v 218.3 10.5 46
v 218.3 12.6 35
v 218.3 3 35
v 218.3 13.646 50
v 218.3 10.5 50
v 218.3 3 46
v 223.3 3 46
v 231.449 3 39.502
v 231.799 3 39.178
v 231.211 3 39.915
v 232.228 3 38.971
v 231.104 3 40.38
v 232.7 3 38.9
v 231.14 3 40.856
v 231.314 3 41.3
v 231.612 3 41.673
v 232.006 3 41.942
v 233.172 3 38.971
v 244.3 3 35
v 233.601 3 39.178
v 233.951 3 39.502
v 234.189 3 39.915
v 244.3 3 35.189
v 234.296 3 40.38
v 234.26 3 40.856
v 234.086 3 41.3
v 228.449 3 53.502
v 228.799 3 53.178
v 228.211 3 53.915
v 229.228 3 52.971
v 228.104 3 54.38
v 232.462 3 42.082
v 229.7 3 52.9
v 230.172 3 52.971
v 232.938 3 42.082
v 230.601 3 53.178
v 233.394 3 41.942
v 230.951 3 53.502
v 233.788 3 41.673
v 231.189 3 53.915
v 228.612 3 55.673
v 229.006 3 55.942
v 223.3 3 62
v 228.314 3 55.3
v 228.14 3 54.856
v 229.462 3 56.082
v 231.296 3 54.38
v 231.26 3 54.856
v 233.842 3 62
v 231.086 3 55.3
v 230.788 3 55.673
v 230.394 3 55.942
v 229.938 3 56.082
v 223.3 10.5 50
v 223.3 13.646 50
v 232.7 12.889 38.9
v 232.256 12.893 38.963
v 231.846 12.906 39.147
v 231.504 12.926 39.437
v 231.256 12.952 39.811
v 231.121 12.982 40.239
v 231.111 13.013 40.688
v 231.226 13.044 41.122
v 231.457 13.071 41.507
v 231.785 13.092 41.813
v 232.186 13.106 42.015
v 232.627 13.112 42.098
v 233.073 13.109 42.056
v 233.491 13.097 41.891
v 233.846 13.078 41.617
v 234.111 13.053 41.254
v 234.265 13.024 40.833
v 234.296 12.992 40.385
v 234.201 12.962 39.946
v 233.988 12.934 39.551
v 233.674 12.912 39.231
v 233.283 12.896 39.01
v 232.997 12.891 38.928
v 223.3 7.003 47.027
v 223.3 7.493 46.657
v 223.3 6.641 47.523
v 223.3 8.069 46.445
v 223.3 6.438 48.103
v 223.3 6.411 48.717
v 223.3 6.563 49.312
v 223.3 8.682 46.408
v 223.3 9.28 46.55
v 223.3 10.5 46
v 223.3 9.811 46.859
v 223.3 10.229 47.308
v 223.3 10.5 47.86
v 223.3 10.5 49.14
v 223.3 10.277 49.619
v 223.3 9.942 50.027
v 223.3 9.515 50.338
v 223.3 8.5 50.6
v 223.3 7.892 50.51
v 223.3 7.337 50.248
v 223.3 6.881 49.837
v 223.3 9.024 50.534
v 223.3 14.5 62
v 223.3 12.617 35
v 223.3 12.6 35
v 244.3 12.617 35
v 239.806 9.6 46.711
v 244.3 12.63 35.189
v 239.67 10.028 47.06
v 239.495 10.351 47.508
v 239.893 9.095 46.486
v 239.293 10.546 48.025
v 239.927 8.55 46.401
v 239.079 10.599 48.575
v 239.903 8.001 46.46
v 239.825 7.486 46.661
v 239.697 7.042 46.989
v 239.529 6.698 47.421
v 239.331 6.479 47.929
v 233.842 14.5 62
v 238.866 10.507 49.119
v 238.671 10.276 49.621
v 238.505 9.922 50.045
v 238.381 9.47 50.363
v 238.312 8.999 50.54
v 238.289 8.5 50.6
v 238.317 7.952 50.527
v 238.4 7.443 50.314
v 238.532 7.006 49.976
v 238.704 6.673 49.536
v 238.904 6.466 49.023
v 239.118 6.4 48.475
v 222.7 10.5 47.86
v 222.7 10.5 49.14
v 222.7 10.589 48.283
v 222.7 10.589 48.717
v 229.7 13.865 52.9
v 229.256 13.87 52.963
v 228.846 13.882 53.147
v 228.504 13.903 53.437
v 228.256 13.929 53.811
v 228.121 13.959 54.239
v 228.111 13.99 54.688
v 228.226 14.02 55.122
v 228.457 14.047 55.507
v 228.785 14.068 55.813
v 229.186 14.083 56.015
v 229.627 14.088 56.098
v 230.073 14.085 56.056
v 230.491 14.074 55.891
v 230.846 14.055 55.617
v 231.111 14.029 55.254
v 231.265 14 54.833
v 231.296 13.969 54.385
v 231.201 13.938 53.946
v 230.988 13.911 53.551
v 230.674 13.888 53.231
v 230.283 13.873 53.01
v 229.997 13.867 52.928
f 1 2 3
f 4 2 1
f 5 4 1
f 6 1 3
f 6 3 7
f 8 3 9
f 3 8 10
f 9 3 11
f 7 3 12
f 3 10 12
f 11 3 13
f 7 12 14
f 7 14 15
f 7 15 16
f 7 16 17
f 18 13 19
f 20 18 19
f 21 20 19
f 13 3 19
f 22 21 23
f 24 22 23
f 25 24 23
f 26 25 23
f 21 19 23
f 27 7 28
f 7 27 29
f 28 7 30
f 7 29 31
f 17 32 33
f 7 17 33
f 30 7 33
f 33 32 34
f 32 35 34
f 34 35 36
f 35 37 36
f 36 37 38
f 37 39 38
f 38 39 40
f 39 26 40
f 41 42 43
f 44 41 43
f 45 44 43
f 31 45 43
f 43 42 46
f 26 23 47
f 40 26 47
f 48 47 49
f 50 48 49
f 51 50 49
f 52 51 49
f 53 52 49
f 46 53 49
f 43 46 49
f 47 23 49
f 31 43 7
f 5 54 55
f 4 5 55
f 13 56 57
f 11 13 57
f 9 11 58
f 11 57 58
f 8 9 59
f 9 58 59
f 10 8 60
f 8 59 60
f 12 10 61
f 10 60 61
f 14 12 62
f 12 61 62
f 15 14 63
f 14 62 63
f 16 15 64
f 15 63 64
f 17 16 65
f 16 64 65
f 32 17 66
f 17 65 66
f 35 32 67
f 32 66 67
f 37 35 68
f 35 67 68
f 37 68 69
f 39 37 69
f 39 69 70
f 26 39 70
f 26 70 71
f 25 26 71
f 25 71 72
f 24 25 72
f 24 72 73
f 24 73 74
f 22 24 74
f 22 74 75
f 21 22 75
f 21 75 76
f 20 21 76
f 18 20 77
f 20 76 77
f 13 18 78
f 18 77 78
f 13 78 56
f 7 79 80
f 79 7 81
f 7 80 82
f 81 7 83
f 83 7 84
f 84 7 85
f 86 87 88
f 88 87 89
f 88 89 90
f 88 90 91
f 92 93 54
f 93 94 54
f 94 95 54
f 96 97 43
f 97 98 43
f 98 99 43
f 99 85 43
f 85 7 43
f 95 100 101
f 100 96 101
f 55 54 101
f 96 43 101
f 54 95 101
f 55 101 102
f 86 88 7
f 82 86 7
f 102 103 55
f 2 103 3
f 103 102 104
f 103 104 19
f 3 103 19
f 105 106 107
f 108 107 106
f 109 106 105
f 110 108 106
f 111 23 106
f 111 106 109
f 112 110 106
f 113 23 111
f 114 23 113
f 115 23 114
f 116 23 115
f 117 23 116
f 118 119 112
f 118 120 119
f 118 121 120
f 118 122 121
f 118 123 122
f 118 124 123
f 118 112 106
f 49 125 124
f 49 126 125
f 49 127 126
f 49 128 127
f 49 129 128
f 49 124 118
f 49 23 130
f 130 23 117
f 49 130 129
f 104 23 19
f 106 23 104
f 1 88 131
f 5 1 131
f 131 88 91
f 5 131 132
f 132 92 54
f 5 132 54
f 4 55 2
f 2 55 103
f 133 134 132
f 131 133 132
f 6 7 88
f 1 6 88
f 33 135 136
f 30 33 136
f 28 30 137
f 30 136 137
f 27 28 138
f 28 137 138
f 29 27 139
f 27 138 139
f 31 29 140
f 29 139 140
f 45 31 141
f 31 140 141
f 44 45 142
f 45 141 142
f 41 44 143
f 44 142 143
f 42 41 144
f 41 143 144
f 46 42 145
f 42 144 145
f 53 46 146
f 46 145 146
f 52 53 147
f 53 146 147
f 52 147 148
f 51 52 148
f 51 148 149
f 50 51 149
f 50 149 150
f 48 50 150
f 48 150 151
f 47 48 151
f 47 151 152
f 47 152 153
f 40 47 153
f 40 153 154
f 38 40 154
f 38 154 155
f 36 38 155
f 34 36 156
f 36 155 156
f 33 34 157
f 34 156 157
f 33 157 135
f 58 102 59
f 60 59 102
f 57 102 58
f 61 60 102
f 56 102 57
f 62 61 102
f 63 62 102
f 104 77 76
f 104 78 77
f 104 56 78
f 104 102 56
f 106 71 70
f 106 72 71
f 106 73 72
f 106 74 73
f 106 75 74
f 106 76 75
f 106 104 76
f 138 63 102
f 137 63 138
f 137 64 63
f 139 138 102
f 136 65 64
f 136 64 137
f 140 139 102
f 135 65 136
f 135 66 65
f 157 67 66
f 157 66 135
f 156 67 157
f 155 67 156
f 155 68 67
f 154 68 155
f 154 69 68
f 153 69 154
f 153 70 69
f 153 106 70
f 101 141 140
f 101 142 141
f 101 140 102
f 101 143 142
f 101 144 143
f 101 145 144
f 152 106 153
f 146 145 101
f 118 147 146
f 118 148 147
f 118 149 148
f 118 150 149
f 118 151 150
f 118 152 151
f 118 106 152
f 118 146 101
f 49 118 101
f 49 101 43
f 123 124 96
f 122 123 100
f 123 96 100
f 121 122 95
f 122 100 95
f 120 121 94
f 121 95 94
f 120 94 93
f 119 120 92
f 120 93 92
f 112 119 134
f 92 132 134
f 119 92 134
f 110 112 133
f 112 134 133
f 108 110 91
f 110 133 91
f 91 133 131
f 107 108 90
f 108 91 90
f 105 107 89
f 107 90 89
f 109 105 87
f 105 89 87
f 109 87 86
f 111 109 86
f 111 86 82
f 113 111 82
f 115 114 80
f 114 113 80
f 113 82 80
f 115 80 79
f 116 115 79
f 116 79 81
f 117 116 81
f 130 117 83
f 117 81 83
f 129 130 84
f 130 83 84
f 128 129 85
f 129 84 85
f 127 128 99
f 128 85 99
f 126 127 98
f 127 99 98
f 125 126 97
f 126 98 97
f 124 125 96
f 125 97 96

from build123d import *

# Parameters (mm, degrees)
CYLINDER181_R     = 2.1
CYLINDER181_DEPTH = 19
CYLINDER127_R     = 1.6
CYLINDER127_DEPTH = 40
CYLINDER124_R     = 1.6
CYLINDER124_DEPTH = 40
EXTRUDE067_DEPTH  = 5
EXTRUDE050_DEPTH  = 15
EXTRUDE049_DEPTH  = 21


with BuildPart() as cylinder181:
    # Cylinder181 → Cylinder181 (new body)
    with BuildSketch(Plane(origin=(15.3, 8.5, 48.5), x_dir=(0, 0, 1), z_dir=(-1, 0, 0))):
        Circle(CYLINDER181_R)
    extrude(amount=CYLINDER181_DEPTH)


with BuildPart() as cylinder127:
    # Cylinder127 → Cylinder127 (new body)
    with BuildSketch(Plane(origin=(5.3, 42, 40.5), x_dir=(0, 0, -1), z_dir=(0, -1, 0))):
        Circle(CYLINDER127_R)
    extrude(amount=CYLINDER127_DEPTH)


with BuildPart() as cylinder124:
    # Cylinder124 → Cylinder124 (new body)
    with BuildSketch(Plane(origin=(8.3, 42, 54.5), x_dir=(0, 0, -1), z_dir=(0, -1, 0))):
        Circle(CYLINDER124_R)
    extrude(amount=CYLINDER124_DEPTH)


with BuildPart() as extrude067:
    # Sketch055 → Extrude067 (new body)
    with BuildSketch(Plane.YZ):
        Polygon((3, 46), (10.5, 46), (10.5, 50), (13.646271, 50), (12.6, 35), (3, 35), align=None)
    extrude(amount=EXTRUDE067_DEPTH)


with BuildPart() as extrude067_1:
    # Extrude067 placement: moved
    add(extrude067.part.moved(Location((14.7, 0, 0))))


with BuildPart() as extrude050:
    # Sketch040 → Extrude050 (new body)
    with BuildSketch(Plane.XZ):
        Polygon((-8.16038, 62.64716), (-8.16038, 30.419451), (4.410427, 62.64716), align=None)
    extrude(amount=-EXTRUDE050_DEPTH)


with BuildPart() as extrude050_1:
    # Extrude050 placement: moved
    add(extrude050.part.moved(Location((0, 1.5, 0))))


with BuildPart() as cut276:
    # Sketch039 → Extrude049 (new body)
    with BuildSketch(Plane.YZ):
        Polygon((3, 62), (3, 35), (12.616711, 35), (14.5, 62), align=None)
    extrude(amount=EXTRUDE049_DEPTH)


with BuildPart() as cut276_1:
    # Extrude049 placement: moved
    add(cut276.part.moved(Location((-6.3, 0, 0))))

    # Cut273: cut Extrude050
    add(extrude050_1.part, mode=Mode.SUBTRACT)

    # Fusion115: union Extrude067
    add(extrude067_1.part)

    # Cut274: cut Cylinder124
    add(cylinder124.part, mode=Mode.SUBTRACT)

    # Cut275: cut Cylinder127
    add(cylinder127.part, mode=Mode.SUBTRACT)

    # Cut276: cut Cylinder181
    add(cylinder181.part, mode=Mode.SUBTRACT)


with BuildPart() as part_mirroring:
    # Part__Mirroring: instance of Cut276
    add(cut276_1.part.mirror(Plane(origin=(0, 8.75, 48.500027), x_dir=(0, -1, 0), z_dir=(1, 0, 0))))


with BuildPart() as part_mirroring_1:
    # Part__Mirroring placement: moved
    add(part_mirroring.part.moved(Location((238, 0, 0))))


solid = part_mirroring_1.part
